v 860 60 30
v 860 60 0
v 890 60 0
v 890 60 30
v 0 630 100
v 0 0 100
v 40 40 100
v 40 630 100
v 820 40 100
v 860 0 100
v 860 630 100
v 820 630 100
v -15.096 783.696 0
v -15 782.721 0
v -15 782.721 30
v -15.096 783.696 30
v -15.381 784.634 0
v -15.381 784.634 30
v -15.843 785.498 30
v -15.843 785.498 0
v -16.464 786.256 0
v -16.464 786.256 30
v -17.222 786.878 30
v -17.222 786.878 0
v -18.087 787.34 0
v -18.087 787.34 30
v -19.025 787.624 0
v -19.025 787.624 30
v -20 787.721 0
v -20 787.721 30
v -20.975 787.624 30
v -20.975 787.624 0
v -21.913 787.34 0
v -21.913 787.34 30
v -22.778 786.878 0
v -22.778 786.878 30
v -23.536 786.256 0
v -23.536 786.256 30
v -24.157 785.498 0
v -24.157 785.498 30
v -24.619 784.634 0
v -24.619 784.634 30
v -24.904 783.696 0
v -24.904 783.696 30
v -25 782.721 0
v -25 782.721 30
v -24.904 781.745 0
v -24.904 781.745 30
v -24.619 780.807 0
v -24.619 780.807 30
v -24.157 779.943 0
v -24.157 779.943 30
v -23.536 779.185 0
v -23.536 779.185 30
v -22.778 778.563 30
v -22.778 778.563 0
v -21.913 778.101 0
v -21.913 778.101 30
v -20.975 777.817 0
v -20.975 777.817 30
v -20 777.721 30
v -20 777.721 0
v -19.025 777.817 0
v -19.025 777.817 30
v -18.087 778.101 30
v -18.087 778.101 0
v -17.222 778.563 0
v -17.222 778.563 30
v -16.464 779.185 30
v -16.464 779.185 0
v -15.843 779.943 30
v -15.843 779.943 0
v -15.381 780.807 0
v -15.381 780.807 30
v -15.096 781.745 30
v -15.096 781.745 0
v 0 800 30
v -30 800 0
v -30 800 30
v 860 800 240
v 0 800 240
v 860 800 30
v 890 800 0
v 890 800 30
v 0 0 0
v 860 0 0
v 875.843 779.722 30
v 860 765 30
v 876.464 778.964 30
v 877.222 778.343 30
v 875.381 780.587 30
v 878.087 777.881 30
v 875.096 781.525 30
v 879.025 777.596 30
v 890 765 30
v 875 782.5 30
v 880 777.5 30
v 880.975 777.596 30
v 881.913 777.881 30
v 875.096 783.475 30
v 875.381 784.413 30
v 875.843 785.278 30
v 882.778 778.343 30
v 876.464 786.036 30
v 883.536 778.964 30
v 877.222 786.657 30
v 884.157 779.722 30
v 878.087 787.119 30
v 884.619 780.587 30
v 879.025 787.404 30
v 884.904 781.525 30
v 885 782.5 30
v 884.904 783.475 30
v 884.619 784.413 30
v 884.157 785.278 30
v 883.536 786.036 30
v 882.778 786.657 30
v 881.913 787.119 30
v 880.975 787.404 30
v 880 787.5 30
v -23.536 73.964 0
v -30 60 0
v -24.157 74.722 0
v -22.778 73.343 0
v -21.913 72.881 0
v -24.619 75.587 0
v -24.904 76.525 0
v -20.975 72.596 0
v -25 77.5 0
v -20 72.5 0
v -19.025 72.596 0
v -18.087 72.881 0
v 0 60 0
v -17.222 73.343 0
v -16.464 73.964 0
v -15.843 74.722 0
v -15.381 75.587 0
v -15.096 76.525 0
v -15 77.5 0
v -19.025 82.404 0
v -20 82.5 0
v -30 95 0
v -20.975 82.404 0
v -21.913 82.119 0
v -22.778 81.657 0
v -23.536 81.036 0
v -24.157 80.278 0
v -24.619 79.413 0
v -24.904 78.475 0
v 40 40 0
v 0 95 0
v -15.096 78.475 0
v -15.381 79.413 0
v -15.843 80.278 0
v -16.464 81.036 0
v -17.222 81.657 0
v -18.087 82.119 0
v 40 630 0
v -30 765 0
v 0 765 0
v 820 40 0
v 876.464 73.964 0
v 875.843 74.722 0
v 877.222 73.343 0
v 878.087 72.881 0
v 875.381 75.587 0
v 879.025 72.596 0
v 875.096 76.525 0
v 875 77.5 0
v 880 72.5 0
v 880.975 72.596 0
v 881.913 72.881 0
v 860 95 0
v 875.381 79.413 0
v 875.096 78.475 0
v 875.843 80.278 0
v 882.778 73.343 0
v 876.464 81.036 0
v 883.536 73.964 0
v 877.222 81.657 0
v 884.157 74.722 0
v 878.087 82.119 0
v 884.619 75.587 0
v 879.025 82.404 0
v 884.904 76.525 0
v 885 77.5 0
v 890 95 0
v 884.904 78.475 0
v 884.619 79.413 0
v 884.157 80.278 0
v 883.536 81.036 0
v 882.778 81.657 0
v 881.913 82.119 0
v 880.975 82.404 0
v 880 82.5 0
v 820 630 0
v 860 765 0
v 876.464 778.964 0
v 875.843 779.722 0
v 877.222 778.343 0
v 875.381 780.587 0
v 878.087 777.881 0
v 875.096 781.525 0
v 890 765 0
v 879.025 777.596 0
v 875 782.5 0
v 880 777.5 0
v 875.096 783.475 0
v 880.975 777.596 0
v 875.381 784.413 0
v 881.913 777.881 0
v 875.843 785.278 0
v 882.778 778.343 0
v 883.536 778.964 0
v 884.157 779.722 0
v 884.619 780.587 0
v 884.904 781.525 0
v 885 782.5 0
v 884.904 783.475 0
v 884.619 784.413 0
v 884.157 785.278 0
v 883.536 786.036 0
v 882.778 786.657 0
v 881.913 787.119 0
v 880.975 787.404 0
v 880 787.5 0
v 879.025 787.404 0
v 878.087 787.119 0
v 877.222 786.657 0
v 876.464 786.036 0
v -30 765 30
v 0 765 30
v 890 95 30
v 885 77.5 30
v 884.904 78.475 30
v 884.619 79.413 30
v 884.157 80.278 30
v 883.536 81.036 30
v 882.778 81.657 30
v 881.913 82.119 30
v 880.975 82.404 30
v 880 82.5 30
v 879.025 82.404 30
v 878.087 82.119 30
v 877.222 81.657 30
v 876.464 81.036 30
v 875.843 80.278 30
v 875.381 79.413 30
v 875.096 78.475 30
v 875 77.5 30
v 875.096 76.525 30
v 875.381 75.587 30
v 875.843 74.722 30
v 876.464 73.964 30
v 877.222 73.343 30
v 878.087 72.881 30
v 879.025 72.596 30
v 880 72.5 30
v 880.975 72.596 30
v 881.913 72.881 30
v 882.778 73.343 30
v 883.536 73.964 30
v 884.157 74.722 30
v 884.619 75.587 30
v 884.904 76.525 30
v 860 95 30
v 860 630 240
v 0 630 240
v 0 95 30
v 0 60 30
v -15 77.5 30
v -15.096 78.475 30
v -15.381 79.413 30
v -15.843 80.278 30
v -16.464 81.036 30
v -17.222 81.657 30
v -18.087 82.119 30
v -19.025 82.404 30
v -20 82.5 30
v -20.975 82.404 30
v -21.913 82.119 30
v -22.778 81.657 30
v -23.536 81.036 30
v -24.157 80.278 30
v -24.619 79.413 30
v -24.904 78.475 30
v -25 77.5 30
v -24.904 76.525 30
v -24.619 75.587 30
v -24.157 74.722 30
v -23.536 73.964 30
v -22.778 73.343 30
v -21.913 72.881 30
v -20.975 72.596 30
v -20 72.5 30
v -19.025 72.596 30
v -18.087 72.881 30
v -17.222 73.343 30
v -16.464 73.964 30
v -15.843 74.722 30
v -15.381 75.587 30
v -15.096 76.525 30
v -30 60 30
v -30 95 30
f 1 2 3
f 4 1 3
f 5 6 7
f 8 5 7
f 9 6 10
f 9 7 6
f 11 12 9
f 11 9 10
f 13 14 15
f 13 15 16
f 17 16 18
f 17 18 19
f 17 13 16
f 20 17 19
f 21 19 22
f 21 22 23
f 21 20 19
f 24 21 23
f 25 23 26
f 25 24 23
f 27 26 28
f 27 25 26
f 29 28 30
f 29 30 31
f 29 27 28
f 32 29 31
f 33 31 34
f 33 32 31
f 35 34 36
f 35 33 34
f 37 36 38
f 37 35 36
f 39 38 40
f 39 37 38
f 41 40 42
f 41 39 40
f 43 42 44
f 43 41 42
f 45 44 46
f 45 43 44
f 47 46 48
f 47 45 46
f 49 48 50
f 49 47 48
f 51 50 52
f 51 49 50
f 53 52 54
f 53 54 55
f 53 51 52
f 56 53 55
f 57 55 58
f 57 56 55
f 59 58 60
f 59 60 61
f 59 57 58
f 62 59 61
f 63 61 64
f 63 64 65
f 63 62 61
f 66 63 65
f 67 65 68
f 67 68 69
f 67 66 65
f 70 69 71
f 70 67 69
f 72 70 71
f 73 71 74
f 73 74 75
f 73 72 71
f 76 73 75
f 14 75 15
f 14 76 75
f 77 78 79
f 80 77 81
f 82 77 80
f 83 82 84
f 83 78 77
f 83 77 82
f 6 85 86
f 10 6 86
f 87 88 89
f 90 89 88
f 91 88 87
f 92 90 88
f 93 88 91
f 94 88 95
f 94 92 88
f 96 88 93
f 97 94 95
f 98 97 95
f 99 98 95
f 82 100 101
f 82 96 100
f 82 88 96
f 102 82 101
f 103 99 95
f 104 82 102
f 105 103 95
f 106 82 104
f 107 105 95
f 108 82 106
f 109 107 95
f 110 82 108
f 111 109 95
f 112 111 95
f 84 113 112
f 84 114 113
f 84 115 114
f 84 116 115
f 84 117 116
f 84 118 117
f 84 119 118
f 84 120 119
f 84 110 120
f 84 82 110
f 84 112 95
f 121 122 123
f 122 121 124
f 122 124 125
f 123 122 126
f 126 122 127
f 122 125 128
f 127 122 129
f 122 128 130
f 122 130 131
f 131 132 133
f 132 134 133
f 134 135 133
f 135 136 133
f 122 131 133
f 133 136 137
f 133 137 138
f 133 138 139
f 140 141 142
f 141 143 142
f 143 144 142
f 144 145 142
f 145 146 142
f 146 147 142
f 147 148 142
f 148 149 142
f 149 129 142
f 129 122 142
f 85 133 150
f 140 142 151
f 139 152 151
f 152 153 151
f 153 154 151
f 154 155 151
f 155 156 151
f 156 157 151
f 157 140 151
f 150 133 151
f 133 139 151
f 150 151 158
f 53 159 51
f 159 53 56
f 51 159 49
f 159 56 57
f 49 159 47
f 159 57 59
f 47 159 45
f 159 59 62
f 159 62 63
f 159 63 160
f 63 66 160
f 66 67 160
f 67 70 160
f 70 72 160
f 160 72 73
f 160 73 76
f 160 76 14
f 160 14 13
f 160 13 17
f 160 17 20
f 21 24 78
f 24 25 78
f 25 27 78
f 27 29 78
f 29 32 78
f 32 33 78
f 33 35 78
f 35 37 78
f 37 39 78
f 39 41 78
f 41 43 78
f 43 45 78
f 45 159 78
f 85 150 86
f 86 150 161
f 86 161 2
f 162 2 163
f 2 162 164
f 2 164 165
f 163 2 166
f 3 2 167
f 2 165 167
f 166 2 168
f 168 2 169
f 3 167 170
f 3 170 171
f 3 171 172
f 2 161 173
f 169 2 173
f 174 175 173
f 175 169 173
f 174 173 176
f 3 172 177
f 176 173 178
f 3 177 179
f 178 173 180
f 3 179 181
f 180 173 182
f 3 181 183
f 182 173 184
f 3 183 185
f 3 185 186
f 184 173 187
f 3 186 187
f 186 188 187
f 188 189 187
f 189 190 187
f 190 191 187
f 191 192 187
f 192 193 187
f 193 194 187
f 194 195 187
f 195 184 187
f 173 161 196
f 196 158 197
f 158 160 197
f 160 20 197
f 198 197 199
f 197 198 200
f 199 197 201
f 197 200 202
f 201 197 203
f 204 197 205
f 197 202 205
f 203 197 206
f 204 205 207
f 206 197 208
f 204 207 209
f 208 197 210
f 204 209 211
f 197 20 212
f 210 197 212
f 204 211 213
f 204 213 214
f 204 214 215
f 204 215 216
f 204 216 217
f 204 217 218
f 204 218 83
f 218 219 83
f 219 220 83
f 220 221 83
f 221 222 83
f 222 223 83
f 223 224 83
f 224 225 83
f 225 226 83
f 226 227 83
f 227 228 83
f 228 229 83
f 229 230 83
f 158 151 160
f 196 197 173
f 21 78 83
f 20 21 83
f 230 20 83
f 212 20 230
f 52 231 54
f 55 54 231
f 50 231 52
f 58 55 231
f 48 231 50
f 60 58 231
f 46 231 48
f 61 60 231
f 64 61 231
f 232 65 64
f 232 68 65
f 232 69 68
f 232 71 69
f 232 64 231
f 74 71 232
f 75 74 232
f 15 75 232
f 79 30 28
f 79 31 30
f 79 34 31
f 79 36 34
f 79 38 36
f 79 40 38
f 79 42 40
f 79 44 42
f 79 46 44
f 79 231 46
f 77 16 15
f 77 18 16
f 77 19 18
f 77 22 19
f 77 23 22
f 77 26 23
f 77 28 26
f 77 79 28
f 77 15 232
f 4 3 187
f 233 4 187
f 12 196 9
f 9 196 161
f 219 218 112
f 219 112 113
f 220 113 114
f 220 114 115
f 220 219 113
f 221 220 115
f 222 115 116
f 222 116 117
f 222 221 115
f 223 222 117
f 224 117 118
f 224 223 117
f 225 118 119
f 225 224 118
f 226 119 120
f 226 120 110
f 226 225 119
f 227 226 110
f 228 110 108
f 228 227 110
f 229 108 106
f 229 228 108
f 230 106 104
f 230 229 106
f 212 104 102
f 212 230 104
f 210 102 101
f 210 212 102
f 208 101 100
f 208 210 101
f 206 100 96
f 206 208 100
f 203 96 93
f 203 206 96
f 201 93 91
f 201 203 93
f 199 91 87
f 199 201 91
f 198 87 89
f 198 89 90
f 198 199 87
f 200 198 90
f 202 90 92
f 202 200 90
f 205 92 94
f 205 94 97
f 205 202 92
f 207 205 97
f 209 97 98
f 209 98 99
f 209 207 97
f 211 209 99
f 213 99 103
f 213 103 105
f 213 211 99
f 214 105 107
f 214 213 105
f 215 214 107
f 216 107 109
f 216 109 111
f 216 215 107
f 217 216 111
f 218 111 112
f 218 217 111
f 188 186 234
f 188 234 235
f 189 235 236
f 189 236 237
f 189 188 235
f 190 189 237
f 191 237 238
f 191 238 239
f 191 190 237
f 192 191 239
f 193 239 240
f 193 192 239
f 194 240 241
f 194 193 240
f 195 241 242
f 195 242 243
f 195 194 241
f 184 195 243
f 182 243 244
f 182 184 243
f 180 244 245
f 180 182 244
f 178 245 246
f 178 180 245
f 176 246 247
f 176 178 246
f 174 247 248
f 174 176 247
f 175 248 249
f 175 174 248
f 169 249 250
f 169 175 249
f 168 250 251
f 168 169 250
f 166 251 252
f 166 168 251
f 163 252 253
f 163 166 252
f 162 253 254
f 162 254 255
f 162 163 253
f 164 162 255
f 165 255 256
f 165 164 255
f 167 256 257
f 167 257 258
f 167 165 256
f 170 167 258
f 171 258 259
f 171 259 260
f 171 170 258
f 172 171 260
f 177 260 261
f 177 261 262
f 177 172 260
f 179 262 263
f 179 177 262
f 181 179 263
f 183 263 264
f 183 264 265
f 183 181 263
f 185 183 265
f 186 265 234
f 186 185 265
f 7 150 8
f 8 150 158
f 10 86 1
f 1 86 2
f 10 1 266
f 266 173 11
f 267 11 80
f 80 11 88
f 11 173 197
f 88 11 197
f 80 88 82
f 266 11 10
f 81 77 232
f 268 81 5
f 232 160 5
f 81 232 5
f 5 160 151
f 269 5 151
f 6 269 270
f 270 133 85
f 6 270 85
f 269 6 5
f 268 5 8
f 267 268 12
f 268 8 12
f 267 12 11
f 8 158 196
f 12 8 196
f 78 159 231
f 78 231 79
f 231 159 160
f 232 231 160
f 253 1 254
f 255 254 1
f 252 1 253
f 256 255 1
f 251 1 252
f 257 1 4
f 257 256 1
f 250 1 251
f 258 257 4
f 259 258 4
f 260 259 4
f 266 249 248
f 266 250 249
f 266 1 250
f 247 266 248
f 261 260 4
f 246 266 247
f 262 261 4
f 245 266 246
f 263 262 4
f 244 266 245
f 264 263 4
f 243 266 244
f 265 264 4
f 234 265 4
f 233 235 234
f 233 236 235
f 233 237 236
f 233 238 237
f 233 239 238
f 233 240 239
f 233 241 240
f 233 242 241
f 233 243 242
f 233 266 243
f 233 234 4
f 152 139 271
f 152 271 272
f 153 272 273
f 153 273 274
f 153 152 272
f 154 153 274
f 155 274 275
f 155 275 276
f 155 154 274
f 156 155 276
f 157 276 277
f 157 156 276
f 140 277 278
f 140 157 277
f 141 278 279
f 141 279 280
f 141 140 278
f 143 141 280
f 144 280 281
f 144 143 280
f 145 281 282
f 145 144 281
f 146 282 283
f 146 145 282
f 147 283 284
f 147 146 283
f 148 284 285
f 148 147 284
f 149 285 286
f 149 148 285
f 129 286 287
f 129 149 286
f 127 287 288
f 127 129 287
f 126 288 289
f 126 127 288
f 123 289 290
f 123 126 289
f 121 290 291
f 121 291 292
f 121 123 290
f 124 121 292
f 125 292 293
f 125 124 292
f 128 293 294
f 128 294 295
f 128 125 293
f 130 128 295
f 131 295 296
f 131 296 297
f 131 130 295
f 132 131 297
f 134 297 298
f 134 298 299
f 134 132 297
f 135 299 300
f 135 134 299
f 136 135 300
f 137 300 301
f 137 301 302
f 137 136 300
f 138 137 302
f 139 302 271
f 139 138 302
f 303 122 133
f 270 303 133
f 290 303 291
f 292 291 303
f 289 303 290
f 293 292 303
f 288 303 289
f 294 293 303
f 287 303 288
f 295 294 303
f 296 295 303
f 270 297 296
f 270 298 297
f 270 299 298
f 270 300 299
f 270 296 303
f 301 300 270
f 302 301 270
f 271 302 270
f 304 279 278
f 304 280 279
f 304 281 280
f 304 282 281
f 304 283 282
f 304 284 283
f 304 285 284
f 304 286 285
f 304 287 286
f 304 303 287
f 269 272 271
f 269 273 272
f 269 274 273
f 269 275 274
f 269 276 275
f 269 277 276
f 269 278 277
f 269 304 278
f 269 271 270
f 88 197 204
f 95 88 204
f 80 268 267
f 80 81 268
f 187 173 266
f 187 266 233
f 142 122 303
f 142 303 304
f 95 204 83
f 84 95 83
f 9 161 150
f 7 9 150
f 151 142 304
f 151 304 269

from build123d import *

# Parameters (mm, degrees)
EXTRUDE_1_DEPTH = 100
EXTRUDE_2_DEPTH = 240
SKETCH_1_4_W    = 30
SKETCH_1_4_H    = 35
SKETCH_1_4_R    = 5
EXTRUDE_3_DEPTH = 30


with BuildPart() as part:
    # Эскиз1 → Бобышка-Вытянуть1 (new body)
    with BuildSketch(Plane.XY):
        Polygon((0, 60), (0, 0), (860, 0), (860, 60), (860, 95), (860, 630), (820, 630), (820, 40), (40, 40), (40, 630), (0, 630), (0, 95), align=None)
    extrude(amount=EXTRUDE_1_DEPTH)

    # Эскиз1<3> → Бобышка-Вытянуть2 (add)
    with BuildSketch(Plane.XY):
        Polygon((0, 765), (0, 630), (40, 630), (820, 630), (860, 630), (860, 765), (860, 800), (0, 800), align=None)
    extrude(amount=EXTRUDE_2_DEPTH)

    # Эскиз1<4> → Бобышка-Вытянуть3 (add)
    # profile 1 of 4: a face of its own
    with BuildSketch(Plane.XY):
        with Locations((-15, 77.5)):
            Rectangle(SKETCH_1_4_W, SKETCH_1_4_H)
        with Locations((-20, 77.5)):
            Circle(SKETCH_1_4_R, mode=Mode.SUBTRACT)
    # profile 2 of 4: a face of its own
    with BuildSketch(Plane.XY):
        with Locations((875, 77.5)):
            Rectangle(SKETCH_1_4_W, SKETCH_1_4_H)
        with Locations((880, 77.5)):
            Circle(SKETCH_1_4_R, mode=Mode.SUBTRACT)
    # profile 3 of 4: a face of its own
    with BuildSketch(Plane.XY):
        with Locations((-15, 782.5)):
            Rectangle(SKETCH_1_4_W, SKETCH_1_4_H)
        with Locations((-20, 782.720518287)):
            Circle(SKETCH_1_4_R, mode=Mode.SUBTRACT)
    # profile 4 of 4: a face of its own
    with BuildSketch(Plane.XY):
        with Locations((875, 782.5)):
            Rectangle(SKETCH_1_4_W, SKETCH_1_4_H)
        with Locations((880, 782.5)):
            Circle(SKETCH_1_4_R, mode=Mode.SUBTRACT)
    extrude(amount=EXTRUDE_3_DEPTH)


solid = part.part
